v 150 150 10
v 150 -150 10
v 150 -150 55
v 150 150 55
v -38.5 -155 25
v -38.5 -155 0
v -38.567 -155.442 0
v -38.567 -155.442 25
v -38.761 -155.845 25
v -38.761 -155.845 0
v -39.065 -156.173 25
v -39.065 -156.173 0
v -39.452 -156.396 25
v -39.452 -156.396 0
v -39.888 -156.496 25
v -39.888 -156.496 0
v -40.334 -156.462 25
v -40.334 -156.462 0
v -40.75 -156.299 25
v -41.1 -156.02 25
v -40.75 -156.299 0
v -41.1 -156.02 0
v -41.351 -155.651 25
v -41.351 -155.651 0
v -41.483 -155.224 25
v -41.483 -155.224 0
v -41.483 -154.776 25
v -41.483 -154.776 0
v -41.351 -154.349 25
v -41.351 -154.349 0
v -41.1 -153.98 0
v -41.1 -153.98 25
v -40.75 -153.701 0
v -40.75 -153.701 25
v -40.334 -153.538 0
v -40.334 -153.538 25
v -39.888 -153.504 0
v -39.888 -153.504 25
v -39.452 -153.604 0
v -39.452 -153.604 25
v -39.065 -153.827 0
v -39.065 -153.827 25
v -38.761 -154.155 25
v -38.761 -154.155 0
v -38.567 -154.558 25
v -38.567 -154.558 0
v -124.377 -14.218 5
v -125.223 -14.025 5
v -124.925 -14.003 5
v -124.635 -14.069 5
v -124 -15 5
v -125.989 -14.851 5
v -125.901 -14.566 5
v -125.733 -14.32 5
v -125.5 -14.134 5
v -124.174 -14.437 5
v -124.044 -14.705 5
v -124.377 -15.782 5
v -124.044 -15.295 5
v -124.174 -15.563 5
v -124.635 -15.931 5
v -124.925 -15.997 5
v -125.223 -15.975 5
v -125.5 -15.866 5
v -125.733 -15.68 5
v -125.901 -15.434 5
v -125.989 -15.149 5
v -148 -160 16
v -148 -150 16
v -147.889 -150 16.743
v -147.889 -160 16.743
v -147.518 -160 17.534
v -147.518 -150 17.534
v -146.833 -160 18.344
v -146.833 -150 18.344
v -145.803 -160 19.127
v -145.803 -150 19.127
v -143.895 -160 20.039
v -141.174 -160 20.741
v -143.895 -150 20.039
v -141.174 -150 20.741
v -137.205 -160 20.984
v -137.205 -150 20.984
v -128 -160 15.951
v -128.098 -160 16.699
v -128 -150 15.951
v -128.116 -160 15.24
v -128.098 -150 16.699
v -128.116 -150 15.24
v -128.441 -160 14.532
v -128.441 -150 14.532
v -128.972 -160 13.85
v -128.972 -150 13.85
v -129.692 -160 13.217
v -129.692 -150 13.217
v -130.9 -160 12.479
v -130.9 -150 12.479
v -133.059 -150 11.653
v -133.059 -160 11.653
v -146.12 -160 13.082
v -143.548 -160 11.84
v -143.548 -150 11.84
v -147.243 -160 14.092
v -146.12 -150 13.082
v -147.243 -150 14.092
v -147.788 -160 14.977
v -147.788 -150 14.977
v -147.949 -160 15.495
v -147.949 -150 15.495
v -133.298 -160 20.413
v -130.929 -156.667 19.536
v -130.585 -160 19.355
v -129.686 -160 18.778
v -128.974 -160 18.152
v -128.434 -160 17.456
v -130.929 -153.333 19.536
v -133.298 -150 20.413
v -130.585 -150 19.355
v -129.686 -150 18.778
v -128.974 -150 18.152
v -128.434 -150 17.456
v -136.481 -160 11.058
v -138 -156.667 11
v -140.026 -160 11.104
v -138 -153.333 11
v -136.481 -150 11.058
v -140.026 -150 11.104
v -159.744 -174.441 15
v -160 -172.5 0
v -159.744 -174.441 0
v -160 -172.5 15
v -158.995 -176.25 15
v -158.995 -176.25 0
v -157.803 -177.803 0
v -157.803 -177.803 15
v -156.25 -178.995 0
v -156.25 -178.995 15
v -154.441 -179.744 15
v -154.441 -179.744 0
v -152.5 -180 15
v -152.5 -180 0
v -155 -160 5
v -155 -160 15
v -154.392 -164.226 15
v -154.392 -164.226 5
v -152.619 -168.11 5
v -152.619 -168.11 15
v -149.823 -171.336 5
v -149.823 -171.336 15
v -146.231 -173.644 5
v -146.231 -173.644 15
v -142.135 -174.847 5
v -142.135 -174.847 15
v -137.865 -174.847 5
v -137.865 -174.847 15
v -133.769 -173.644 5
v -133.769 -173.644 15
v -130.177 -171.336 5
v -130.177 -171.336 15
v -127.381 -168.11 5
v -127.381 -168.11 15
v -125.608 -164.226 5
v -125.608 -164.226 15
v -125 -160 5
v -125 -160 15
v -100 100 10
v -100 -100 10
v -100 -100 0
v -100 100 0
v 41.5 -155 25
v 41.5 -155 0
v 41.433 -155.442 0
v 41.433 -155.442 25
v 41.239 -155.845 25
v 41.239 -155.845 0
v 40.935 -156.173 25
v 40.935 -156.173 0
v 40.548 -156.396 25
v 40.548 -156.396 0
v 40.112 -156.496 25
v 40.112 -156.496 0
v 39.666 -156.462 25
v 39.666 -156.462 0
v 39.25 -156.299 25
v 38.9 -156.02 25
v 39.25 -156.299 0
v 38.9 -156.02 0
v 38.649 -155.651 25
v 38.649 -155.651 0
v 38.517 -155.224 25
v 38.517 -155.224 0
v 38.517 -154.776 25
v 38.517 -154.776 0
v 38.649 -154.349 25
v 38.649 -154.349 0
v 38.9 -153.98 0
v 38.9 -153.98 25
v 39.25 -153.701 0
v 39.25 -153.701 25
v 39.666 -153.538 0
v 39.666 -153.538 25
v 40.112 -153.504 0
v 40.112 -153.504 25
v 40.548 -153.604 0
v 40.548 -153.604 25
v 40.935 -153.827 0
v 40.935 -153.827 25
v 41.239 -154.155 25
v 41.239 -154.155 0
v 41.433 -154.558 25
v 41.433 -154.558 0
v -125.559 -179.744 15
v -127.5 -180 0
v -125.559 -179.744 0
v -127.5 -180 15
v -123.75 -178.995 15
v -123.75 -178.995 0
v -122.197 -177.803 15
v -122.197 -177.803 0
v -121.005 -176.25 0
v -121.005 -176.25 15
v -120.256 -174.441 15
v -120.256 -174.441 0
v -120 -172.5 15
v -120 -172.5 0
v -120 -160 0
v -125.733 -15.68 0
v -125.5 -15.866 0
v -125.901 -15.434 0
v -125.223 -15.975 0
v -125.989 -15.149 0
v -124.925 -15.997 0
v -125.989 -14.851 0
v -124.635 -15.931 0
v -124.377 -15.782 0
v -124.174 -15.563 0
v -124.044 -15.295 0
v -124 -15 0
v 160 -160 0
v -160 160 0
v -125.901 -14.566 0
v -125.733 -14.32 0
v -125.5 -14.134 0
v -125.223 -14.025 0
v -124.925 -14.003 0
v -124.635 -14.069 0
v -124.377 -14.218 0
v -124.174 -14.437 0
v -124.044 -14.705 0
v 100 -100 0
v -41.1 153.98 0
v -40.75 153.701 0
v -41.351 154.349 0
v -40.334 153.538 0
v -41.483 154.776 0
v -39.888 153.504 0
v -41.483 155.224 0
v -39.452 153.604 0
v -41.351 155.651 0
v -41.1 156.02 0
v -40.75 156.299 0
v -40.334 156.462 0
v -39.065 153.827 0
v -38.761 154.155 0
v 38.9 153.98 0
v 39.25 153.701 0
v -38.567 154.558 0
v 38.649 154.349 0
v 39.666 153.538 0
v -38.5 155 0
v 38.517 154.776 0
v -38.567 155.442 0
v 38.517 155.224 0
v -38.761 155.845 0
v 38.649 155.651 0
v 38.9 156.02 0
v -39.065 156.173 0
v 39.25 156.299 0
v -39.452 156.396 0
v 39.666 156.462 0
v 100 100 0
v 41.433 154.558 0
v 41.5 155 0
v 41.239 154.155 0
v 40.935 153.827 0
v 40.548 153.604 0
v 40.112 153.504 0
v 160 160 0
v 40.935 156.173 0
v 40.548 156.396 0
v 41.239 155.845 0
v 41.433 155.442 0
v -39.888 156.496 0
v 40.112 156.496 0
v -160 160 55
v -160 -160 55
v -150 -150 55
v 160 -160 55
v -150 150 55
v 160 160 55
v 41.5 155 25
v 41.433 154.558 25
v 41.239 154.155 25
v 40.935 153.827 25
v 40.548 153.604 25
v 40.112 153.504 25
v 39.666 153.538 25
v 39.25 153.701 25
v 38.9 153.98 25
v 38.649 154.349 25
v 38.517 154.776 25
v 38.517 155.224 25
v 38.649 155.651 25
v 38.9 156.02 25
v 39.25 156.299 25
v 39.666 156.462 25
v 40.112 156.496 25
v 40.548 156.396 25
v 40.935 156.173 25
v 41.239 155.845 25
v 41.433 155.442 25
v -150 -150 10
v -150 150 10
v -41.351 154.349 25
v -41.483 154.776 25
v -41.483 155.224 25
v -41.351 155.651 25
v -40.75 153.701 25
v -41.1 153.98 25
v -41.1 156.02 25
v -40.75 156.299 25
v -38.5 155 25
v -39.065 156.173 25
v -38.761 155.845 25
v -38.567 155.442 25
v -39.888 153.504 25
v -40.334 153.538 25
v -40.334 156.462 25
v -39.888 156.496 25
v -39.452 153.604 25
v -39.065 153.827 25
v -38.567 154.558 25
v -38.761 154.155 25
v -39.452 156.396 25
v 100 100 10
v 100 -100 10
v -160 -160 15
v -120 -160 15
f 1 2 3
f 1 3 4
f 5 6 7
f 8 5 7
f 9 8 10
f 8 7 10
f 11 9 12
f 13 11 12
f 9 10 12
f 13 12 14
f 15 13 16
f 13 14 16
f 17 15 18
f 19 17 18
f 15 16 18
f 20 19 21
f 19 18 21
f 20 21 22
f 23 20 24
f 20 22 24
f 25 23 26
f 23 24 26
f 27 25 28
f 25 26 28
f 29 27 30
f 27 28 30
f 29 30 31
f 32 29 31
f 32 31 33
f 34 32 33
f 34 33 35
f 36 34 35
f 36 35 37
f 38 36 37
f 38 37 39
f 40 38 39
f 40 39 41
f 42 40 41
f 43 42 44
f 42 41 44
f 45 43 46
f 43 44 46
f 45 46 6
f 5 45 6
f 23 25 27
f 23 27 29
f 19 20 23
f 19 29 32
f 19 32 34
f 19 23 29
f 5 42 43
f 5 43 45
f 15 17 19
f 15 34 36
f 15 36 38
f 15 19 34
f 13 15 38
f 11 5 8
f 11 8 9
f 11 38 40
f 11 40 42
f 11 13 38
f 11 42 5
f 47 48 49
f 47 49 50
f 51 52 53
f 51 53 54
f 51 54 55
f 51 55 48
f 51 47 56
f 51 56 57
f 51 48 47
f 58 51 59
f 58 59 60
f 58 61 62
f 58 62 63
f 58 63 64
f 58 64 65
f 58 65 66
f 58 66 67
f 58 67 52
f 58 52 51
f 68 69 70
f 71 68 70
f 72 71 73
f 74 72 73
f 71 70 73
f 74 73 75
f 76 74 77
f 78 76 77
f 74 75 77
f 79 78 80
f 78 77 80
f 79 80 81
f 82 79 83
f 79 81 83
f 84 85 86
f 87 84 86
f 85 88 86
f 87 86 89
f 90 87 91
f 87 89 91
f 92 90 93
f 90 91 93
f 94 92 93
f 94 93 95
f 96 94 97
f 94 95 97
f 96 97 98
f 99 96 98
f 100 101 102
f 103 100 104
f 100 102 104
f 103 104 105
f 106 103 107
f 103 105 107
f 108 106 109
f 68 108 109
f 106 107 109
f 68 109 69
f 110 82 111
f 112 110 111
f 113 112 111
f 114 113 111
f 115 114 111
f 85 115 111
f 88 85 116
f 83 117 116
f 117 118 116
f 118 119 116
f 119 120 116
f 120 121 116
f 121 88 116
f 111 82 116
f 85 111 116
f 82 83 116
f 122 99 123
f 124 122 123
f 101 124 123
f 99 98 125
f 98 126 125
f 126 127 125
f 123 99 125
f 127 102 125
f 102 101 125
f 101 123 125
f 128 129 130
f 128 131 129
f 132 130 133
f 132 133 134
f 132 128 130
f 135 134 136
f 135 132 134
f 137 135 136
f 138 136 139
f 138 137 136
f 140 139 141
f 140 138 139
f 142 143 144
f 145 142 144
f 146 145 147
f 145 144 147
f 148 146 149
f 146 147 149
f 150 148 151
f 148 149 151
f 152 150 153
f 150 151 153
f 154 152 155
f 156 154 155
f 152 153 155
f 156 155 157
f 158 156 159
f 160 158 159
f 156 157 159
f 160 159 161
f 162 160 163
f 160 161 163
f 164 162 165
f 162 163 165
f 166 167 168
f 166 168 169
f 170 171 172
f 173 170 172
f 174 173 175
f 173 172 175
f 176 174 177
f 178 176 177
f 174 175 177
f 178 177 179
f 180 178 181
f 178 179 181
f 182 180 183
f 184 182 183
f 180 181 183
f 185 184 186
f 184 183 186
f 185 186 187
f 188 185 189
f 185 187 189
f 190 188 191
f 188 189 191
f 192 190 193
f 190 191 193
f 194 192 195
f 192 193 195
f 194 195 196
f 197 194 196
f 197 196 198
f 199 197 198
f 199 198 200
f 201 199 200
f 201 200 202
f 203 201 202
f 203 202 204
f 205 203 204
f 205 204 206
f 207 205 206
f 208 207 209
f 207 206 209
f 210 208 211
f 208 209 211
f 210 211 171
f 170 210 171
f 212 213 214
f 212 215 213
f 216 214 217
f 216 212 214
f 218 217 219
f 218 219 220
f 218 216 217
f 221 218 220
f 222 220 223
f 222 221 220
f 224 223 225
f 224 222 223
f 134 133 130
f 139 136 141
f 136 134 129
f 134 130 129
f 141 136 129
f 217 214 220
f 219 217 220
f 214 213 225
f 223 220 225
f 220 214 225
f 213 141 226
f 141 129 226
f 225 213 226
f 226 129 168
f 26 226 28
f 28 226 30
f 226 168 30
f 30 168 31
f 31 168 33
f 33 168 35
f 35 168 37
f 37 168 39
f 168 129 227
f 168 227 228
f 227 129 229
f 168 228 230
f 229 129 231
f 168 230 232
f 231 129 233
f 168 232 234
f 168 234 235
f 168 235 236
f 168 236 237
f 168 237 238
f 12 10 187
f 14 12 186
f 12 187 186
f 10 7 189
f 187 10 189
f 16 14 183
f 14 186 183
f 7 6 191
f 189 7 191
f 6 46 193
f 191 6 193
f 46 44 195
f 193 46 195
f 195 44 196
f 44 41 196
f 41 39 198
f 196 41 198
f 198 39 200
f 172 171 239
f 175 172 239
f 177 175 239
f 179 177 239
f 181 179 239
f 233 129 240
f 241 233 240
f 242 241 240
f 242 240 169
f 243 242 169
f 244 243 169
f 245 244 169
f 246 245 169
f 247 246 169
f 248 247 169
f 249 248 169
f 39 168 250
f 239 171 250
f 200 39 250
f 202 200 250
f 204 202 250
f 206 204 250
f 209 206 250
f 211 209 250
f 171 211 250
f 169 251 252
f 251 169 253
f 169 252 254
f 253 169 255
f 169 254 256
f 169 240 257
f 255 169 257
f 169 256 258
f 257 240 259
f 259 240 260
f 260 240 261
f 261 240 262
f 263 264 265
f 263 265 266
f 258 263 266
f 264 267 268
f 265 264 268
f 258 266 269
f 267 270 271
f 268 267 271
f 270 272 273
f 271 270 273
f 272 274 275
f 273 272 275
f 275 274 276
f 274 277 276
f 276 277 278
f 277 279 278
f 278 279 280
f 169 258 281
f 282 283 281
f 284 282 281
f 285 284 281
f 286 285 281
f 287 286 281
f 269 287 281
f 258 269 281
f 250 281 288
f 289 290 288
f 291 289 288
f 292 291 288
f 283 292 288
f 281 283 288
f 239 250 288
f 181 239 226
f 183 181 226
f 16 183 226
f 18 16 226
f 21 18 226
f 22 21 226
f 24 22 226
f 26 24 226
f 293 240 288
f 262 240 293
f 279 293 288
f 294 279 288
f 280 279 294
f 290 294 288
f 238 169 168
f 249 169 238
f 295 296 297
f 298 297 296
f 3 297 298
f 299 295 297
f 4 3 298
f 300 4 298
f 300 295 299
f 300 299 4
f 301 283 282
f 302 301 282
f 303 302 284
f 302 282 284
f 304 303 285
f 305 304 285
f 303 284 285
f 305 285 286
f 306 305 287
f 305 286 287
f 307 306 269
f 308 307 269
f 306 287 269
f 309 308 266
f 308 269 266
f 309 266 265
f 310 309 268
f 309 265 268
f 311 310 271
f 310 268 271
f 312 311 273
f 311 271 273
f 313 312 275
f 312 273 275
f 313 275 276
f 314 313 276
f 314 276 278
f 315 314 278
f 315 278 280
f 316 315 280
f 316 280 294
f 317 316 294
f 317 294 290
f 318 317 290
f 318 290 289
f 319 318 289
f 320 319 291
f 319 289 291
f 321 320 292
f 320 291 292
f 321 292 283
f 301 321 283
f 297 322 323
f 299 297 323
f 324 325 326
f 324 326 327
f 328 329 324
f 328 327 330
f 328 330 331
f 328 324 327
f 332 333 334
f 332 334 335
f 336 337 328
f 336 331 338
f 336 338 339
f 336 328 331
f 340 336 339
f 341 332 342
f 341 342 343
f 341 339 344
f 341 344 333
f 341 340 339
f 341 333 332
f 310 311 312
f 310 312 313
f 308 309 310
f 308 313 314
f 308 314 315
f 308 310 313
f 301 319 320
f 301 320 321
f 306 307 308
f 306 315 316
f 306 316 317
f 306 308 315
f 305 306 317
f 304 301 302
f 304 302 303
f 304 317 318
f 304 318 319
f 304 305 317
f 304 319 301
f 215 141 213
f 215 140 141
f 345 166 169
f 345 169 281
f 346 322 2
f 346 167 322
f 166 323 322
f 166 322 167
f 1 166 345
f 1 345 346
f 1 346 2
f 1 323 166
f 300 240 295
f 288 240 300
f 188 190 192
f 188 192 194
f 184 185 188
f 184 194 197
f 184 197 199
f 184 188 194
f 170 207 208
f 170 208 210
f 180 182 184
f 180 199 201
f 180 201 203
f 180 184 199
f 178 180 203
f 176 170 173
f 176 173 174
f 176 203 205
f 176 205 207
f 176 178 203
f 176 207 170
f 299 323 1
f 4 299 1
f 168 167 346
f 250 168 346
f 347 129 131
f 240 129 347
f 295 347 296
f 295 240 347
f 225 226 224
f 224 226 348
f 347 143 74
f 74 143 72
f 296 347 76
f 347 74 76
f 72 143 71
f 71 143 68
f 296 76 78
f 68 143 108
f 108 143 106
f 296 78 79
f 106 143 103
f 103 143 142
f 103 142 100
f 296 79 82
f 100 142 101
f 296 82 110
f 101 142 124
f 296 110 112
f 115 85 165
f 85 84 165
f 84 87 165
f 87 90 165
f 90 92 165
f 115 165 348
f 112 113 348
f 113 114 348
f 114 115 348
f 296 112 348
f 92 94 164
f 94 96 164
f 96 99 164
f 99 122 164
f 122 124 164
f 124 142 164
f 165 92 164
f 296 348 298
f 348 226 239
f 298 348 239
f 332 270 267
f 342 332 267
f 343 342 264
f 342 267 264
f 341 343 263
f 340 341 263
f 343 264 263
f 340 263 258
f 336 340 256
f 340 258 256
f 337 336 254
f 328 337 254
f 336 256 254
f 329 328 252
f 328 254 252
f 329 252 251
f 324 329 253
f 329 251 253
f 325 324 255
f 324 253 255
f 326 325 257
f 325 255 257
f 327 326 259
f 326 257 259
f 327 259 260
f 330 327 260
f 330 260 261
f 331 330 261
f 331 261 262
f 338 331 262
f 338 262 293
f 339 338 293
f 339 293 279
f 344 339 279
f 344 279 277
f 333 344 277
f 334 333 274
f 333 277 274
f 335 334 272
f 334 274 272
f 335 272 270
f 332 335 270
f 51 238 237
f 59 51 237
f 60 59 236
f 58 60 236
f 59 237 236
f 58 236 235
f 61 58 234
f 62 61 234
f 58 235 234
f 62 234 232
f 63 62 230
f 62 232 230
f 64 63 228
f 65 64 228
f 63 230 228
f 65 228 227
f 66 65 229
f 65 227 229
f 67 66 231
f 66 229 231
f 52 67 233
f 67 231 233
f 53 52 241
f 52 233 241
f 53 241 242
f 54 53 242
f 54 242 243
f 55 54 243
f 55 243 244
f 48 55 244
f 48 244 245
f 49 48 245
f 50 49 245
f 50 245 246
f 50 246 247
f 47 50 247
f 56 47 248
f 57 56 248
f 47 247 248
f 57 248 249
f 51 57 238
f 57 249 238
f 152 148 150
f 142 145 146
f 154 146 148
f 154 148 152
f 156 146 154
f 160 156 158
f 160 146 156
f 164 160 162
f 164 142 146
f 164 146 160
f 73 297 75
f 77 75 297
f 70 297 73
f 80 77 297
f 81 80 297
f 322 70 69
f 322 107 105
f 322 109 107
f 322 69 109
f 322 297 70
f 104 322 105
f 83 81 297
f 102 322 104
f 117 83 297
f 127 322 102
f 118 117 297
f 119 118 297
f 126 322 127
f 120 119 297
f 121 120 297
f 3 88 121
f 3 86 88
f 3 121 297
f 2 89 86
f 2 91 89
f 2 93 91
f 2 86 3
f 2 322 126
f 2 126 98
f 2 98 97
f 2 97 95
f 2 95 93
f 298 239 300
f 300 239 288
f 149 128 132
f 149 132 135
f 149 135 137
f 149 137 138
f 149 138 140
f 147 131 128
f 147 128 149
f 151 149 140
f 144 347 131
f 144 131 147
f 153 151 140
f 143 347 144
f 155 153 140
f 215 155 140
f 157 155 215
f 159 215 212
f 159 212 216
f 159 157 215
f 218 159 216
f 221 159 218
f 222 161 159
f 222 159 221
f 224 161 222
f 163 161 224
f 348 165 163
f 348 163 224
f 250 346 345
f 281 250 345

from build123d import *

# Parameters (mm, degrees)
F0_W      = 320
F0_H      = 320
F1_DEPTH  = 10
F2_W      = 320
F2_H      = 320
F2_W_2    = 300
F2_H_2    = 300
F3_DEPTH  = 45
F4_W      = 200
F4_H      = 200
F5_DEPTH  = 25
F6_W      = 40
F6_H      = 15
F7_DEPTH  = 20
F9_DEPTH  = 10
F10_R     = 7.5
F12_DEPTH = 10
F13_R     = 1.5
F14_DEPTH = 25
F15_R     = 1
F16_DEPTH = 5


with BuildPart() as f1:
    # F0 (on Top) → F1 (new body)
    with BuildSketch(Plane.XY):
        Rectangle(F0_W, F0_H)
    extrude(amount=F1_DEPTH)

    # F2 (on face) → F3 (join)
    with BuildSketch(Plane.XY.offset(10)):
        Rectangle(F2_W, F2_H)
        Rectangle(F2_W_2, F2_H_2, mode=Mode.SUBTRACT)
    extrude(amount=F3_DEPTH)

    # F4 (on face) → F5 (cut)
    with BuildSketch(Plane.XY.offset(10)):
        Rectangle(F4_W, F4_H)
    extrude(amount=-F5_DEPTH, mode=Mode.SUBTRACT)

    # F6 (on face) → F7 (join)
    with BuildSketch(Plane.XZ.offset(160)):
        with Locations((-140, 7.5)):
            Rectangle(F6_W, F6_H)
    extrude(amount=F7_DEPTH)

    # F8 (on face) → F9 (cut)
    with BuildSketch(Plane.XY.offset(15)):
        with BuildLine():
            Line((-125, -160), (-155, -160))
            ThreePointArc((-155, -160), (-140, -175), (-125, -160))
        make_face()
    extrude(amount=-F9_DEPTH, mode=Mode.SUBTRACT)

    # F10
    f10_edges = [f1.edges().sort_by_distance(p)[0] for p in [
        (-120, -180, 7.5),
        (-160, -180, 7.5),
    ]]
    fillet(f10_edges, radius=F10_R)

    # F11 (on face) → F12 (cut)
    with BuildSketch(Plane(origin=(0, -150, 0), x_dir=(-1, 0, 0), z_dir=(0, 1, 0))):
        with BuildLine():
            add(Edge.make_bspline(
                [(138, 11), (148, 11), (148, 16)],
                knots=[4.7123889804, 4.7123889804, 4.7123889804, 6.2831853072, 6.2831853072, 6.2831853072], degree=2, weights=[1, 0.7071067812, 1]))
            add(Edge.make_bspline(
                [(148, 16), (148, 28.0710678119), (130.9289321881, 19.5355339059), (113.8578643763, 11), (138, 11)],
                knots=[0, 0, 0, 2.3561944902, 2.3561944902, 4.7123889804, 4.7123889804, 4.7123889804], degree=2, weights=[1, 0.3826834324, 1, 0.3826834324, 1]))
        make_face()
    extrude(amount=-F12_DEPTH, mode=Mode.SUBTRACT)

    # F13 (on face) → F14 (cut)
    with BuildSketch(Plane(origin=(0, 0, 0), x_dir=(1, 0, 0), z_dir=(0, 0, -1))):
        with Locations((-40, 155)):
            Circle(F13_R)
        with Locations((40, 155)):
            Circle(F13_R)
        with Locations((40, -155)):
            Circle(F13_R)
        with Locations((-40, -155)):
            Circle(F13_R)
    extrude(amount=-F14_DEPTH, mode=Mode.SUBTRACT)

    # F15 (on face) → F16 (cut)
    with BuildSketch(Plane(origin=(0, 0, 0), x_dir=(1, 0, 0), z_dir=(0, 0, -1))):
        with Locations((-125, 15)):
            Circle(F15_R)
    extrude(amount=-F16_DEPTH, mode=Mode.SUBTRACT)


solid = f1.part
